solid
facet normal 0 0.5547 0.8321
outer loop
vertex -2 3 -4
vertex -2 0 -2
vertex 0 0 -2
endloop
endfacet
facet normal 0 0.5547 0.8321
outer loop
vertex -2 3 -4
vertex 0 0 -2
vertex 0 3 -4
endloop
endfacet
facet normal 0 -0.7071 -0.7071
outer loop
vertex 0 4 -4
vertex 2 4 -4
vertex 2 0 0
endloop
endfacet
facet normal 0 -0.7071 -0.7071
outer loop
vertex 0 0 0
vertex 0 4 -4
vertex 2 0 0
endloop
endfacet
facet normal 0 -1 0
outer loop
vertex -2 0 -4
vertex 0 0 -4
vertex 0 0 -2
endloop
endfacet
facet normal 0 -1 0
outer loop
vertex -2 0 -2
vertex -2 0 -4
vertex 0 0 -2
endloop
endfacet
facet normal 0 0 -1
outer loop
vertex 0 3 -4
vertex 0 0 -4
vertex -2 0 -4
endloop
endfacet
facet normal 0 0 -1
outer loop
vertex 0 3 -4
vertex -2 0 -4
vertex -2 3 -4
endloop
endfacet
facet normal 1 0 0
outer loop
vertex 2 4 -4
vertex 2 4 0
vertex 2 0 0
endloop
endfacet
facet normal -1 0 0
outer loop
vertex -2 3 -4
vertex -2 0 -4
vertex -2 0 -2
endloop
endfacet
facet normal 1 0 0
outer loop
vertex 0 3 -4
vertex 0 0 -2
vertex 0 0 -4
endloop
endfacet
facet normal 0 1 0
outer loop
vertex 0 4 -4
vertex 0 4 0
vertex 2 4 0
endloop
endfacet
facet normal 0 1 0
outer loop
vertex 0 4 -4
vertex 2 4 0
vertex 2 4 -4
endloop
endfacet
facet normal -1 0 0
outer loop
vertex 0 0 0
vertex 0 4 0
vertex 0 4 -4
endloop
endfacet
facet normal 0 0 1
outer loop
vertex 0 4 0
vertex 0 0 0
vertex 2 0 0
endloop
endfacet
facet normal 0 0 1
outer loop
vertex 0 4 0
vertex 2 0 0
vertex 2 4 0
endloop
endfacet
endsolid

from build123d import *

# Parameters (mm, degrees)
SKETCH1_W           = 4
SKETCH1_H           = 4
BOSS_EXTRUDE1_DEPTH = 2
SKETCH2_W           = 2
SKETCH2_H           = 3
BOSS_EXTRUDE2_DEPTH = 2
CUT_EXTRUDE1_DEPTH  = 2
CUT_EXTRUDE2_DEPTH  = 2


with BuildPart() as part:
    # Sketch1 → Boss-Extrude1 (new body)
    with BuildSketch(Plane(origin=(0, 0, 0), x_dir=(0, 0, -1), z_dir=(1, 0, 0))):
        with Locations((2, 2)):
            Rectangle(SKETCH1_W, SKETCH1_H)
    extrude(amount=BOSS_EXTRUDE1_DEPTH)

    # Sketch2 → Boss-Extrude2 (add)
    with BuildSketch(Plane.ZY):
        with Locations((-3, 1.5)):
            Rectangle(SKETCH2_W, SKETCH2_H)
    extrude(amount=BOSS_EXTRUDE2_DEPTH)

    # Sketch3 → Cut-Extrude1 (cut)
    with BuildSketch(Plane.ZY.offset(2)):
        Polygon((-4, 3), (-2, 3), (-2, 0), align=None)
    extrude(amount=-CUT_EXTRUDE1_DEPTH, mode=Mode.SUBTRACT)

    # Sketch4 → Cut-Extrude2 (cut)
    with BuildSketch(Plane(origin=(2, 0, 0), x_dir=(0, 0, -1), z_dir=(1, 0, 0))):
        Polygon((4, 4), (0, 0), (4, 0), align=None)
    extrude(amount=-CUT_EXTRUDE2_DEPTH, mode=Mode.SUBTRACT)


solid = part.part
